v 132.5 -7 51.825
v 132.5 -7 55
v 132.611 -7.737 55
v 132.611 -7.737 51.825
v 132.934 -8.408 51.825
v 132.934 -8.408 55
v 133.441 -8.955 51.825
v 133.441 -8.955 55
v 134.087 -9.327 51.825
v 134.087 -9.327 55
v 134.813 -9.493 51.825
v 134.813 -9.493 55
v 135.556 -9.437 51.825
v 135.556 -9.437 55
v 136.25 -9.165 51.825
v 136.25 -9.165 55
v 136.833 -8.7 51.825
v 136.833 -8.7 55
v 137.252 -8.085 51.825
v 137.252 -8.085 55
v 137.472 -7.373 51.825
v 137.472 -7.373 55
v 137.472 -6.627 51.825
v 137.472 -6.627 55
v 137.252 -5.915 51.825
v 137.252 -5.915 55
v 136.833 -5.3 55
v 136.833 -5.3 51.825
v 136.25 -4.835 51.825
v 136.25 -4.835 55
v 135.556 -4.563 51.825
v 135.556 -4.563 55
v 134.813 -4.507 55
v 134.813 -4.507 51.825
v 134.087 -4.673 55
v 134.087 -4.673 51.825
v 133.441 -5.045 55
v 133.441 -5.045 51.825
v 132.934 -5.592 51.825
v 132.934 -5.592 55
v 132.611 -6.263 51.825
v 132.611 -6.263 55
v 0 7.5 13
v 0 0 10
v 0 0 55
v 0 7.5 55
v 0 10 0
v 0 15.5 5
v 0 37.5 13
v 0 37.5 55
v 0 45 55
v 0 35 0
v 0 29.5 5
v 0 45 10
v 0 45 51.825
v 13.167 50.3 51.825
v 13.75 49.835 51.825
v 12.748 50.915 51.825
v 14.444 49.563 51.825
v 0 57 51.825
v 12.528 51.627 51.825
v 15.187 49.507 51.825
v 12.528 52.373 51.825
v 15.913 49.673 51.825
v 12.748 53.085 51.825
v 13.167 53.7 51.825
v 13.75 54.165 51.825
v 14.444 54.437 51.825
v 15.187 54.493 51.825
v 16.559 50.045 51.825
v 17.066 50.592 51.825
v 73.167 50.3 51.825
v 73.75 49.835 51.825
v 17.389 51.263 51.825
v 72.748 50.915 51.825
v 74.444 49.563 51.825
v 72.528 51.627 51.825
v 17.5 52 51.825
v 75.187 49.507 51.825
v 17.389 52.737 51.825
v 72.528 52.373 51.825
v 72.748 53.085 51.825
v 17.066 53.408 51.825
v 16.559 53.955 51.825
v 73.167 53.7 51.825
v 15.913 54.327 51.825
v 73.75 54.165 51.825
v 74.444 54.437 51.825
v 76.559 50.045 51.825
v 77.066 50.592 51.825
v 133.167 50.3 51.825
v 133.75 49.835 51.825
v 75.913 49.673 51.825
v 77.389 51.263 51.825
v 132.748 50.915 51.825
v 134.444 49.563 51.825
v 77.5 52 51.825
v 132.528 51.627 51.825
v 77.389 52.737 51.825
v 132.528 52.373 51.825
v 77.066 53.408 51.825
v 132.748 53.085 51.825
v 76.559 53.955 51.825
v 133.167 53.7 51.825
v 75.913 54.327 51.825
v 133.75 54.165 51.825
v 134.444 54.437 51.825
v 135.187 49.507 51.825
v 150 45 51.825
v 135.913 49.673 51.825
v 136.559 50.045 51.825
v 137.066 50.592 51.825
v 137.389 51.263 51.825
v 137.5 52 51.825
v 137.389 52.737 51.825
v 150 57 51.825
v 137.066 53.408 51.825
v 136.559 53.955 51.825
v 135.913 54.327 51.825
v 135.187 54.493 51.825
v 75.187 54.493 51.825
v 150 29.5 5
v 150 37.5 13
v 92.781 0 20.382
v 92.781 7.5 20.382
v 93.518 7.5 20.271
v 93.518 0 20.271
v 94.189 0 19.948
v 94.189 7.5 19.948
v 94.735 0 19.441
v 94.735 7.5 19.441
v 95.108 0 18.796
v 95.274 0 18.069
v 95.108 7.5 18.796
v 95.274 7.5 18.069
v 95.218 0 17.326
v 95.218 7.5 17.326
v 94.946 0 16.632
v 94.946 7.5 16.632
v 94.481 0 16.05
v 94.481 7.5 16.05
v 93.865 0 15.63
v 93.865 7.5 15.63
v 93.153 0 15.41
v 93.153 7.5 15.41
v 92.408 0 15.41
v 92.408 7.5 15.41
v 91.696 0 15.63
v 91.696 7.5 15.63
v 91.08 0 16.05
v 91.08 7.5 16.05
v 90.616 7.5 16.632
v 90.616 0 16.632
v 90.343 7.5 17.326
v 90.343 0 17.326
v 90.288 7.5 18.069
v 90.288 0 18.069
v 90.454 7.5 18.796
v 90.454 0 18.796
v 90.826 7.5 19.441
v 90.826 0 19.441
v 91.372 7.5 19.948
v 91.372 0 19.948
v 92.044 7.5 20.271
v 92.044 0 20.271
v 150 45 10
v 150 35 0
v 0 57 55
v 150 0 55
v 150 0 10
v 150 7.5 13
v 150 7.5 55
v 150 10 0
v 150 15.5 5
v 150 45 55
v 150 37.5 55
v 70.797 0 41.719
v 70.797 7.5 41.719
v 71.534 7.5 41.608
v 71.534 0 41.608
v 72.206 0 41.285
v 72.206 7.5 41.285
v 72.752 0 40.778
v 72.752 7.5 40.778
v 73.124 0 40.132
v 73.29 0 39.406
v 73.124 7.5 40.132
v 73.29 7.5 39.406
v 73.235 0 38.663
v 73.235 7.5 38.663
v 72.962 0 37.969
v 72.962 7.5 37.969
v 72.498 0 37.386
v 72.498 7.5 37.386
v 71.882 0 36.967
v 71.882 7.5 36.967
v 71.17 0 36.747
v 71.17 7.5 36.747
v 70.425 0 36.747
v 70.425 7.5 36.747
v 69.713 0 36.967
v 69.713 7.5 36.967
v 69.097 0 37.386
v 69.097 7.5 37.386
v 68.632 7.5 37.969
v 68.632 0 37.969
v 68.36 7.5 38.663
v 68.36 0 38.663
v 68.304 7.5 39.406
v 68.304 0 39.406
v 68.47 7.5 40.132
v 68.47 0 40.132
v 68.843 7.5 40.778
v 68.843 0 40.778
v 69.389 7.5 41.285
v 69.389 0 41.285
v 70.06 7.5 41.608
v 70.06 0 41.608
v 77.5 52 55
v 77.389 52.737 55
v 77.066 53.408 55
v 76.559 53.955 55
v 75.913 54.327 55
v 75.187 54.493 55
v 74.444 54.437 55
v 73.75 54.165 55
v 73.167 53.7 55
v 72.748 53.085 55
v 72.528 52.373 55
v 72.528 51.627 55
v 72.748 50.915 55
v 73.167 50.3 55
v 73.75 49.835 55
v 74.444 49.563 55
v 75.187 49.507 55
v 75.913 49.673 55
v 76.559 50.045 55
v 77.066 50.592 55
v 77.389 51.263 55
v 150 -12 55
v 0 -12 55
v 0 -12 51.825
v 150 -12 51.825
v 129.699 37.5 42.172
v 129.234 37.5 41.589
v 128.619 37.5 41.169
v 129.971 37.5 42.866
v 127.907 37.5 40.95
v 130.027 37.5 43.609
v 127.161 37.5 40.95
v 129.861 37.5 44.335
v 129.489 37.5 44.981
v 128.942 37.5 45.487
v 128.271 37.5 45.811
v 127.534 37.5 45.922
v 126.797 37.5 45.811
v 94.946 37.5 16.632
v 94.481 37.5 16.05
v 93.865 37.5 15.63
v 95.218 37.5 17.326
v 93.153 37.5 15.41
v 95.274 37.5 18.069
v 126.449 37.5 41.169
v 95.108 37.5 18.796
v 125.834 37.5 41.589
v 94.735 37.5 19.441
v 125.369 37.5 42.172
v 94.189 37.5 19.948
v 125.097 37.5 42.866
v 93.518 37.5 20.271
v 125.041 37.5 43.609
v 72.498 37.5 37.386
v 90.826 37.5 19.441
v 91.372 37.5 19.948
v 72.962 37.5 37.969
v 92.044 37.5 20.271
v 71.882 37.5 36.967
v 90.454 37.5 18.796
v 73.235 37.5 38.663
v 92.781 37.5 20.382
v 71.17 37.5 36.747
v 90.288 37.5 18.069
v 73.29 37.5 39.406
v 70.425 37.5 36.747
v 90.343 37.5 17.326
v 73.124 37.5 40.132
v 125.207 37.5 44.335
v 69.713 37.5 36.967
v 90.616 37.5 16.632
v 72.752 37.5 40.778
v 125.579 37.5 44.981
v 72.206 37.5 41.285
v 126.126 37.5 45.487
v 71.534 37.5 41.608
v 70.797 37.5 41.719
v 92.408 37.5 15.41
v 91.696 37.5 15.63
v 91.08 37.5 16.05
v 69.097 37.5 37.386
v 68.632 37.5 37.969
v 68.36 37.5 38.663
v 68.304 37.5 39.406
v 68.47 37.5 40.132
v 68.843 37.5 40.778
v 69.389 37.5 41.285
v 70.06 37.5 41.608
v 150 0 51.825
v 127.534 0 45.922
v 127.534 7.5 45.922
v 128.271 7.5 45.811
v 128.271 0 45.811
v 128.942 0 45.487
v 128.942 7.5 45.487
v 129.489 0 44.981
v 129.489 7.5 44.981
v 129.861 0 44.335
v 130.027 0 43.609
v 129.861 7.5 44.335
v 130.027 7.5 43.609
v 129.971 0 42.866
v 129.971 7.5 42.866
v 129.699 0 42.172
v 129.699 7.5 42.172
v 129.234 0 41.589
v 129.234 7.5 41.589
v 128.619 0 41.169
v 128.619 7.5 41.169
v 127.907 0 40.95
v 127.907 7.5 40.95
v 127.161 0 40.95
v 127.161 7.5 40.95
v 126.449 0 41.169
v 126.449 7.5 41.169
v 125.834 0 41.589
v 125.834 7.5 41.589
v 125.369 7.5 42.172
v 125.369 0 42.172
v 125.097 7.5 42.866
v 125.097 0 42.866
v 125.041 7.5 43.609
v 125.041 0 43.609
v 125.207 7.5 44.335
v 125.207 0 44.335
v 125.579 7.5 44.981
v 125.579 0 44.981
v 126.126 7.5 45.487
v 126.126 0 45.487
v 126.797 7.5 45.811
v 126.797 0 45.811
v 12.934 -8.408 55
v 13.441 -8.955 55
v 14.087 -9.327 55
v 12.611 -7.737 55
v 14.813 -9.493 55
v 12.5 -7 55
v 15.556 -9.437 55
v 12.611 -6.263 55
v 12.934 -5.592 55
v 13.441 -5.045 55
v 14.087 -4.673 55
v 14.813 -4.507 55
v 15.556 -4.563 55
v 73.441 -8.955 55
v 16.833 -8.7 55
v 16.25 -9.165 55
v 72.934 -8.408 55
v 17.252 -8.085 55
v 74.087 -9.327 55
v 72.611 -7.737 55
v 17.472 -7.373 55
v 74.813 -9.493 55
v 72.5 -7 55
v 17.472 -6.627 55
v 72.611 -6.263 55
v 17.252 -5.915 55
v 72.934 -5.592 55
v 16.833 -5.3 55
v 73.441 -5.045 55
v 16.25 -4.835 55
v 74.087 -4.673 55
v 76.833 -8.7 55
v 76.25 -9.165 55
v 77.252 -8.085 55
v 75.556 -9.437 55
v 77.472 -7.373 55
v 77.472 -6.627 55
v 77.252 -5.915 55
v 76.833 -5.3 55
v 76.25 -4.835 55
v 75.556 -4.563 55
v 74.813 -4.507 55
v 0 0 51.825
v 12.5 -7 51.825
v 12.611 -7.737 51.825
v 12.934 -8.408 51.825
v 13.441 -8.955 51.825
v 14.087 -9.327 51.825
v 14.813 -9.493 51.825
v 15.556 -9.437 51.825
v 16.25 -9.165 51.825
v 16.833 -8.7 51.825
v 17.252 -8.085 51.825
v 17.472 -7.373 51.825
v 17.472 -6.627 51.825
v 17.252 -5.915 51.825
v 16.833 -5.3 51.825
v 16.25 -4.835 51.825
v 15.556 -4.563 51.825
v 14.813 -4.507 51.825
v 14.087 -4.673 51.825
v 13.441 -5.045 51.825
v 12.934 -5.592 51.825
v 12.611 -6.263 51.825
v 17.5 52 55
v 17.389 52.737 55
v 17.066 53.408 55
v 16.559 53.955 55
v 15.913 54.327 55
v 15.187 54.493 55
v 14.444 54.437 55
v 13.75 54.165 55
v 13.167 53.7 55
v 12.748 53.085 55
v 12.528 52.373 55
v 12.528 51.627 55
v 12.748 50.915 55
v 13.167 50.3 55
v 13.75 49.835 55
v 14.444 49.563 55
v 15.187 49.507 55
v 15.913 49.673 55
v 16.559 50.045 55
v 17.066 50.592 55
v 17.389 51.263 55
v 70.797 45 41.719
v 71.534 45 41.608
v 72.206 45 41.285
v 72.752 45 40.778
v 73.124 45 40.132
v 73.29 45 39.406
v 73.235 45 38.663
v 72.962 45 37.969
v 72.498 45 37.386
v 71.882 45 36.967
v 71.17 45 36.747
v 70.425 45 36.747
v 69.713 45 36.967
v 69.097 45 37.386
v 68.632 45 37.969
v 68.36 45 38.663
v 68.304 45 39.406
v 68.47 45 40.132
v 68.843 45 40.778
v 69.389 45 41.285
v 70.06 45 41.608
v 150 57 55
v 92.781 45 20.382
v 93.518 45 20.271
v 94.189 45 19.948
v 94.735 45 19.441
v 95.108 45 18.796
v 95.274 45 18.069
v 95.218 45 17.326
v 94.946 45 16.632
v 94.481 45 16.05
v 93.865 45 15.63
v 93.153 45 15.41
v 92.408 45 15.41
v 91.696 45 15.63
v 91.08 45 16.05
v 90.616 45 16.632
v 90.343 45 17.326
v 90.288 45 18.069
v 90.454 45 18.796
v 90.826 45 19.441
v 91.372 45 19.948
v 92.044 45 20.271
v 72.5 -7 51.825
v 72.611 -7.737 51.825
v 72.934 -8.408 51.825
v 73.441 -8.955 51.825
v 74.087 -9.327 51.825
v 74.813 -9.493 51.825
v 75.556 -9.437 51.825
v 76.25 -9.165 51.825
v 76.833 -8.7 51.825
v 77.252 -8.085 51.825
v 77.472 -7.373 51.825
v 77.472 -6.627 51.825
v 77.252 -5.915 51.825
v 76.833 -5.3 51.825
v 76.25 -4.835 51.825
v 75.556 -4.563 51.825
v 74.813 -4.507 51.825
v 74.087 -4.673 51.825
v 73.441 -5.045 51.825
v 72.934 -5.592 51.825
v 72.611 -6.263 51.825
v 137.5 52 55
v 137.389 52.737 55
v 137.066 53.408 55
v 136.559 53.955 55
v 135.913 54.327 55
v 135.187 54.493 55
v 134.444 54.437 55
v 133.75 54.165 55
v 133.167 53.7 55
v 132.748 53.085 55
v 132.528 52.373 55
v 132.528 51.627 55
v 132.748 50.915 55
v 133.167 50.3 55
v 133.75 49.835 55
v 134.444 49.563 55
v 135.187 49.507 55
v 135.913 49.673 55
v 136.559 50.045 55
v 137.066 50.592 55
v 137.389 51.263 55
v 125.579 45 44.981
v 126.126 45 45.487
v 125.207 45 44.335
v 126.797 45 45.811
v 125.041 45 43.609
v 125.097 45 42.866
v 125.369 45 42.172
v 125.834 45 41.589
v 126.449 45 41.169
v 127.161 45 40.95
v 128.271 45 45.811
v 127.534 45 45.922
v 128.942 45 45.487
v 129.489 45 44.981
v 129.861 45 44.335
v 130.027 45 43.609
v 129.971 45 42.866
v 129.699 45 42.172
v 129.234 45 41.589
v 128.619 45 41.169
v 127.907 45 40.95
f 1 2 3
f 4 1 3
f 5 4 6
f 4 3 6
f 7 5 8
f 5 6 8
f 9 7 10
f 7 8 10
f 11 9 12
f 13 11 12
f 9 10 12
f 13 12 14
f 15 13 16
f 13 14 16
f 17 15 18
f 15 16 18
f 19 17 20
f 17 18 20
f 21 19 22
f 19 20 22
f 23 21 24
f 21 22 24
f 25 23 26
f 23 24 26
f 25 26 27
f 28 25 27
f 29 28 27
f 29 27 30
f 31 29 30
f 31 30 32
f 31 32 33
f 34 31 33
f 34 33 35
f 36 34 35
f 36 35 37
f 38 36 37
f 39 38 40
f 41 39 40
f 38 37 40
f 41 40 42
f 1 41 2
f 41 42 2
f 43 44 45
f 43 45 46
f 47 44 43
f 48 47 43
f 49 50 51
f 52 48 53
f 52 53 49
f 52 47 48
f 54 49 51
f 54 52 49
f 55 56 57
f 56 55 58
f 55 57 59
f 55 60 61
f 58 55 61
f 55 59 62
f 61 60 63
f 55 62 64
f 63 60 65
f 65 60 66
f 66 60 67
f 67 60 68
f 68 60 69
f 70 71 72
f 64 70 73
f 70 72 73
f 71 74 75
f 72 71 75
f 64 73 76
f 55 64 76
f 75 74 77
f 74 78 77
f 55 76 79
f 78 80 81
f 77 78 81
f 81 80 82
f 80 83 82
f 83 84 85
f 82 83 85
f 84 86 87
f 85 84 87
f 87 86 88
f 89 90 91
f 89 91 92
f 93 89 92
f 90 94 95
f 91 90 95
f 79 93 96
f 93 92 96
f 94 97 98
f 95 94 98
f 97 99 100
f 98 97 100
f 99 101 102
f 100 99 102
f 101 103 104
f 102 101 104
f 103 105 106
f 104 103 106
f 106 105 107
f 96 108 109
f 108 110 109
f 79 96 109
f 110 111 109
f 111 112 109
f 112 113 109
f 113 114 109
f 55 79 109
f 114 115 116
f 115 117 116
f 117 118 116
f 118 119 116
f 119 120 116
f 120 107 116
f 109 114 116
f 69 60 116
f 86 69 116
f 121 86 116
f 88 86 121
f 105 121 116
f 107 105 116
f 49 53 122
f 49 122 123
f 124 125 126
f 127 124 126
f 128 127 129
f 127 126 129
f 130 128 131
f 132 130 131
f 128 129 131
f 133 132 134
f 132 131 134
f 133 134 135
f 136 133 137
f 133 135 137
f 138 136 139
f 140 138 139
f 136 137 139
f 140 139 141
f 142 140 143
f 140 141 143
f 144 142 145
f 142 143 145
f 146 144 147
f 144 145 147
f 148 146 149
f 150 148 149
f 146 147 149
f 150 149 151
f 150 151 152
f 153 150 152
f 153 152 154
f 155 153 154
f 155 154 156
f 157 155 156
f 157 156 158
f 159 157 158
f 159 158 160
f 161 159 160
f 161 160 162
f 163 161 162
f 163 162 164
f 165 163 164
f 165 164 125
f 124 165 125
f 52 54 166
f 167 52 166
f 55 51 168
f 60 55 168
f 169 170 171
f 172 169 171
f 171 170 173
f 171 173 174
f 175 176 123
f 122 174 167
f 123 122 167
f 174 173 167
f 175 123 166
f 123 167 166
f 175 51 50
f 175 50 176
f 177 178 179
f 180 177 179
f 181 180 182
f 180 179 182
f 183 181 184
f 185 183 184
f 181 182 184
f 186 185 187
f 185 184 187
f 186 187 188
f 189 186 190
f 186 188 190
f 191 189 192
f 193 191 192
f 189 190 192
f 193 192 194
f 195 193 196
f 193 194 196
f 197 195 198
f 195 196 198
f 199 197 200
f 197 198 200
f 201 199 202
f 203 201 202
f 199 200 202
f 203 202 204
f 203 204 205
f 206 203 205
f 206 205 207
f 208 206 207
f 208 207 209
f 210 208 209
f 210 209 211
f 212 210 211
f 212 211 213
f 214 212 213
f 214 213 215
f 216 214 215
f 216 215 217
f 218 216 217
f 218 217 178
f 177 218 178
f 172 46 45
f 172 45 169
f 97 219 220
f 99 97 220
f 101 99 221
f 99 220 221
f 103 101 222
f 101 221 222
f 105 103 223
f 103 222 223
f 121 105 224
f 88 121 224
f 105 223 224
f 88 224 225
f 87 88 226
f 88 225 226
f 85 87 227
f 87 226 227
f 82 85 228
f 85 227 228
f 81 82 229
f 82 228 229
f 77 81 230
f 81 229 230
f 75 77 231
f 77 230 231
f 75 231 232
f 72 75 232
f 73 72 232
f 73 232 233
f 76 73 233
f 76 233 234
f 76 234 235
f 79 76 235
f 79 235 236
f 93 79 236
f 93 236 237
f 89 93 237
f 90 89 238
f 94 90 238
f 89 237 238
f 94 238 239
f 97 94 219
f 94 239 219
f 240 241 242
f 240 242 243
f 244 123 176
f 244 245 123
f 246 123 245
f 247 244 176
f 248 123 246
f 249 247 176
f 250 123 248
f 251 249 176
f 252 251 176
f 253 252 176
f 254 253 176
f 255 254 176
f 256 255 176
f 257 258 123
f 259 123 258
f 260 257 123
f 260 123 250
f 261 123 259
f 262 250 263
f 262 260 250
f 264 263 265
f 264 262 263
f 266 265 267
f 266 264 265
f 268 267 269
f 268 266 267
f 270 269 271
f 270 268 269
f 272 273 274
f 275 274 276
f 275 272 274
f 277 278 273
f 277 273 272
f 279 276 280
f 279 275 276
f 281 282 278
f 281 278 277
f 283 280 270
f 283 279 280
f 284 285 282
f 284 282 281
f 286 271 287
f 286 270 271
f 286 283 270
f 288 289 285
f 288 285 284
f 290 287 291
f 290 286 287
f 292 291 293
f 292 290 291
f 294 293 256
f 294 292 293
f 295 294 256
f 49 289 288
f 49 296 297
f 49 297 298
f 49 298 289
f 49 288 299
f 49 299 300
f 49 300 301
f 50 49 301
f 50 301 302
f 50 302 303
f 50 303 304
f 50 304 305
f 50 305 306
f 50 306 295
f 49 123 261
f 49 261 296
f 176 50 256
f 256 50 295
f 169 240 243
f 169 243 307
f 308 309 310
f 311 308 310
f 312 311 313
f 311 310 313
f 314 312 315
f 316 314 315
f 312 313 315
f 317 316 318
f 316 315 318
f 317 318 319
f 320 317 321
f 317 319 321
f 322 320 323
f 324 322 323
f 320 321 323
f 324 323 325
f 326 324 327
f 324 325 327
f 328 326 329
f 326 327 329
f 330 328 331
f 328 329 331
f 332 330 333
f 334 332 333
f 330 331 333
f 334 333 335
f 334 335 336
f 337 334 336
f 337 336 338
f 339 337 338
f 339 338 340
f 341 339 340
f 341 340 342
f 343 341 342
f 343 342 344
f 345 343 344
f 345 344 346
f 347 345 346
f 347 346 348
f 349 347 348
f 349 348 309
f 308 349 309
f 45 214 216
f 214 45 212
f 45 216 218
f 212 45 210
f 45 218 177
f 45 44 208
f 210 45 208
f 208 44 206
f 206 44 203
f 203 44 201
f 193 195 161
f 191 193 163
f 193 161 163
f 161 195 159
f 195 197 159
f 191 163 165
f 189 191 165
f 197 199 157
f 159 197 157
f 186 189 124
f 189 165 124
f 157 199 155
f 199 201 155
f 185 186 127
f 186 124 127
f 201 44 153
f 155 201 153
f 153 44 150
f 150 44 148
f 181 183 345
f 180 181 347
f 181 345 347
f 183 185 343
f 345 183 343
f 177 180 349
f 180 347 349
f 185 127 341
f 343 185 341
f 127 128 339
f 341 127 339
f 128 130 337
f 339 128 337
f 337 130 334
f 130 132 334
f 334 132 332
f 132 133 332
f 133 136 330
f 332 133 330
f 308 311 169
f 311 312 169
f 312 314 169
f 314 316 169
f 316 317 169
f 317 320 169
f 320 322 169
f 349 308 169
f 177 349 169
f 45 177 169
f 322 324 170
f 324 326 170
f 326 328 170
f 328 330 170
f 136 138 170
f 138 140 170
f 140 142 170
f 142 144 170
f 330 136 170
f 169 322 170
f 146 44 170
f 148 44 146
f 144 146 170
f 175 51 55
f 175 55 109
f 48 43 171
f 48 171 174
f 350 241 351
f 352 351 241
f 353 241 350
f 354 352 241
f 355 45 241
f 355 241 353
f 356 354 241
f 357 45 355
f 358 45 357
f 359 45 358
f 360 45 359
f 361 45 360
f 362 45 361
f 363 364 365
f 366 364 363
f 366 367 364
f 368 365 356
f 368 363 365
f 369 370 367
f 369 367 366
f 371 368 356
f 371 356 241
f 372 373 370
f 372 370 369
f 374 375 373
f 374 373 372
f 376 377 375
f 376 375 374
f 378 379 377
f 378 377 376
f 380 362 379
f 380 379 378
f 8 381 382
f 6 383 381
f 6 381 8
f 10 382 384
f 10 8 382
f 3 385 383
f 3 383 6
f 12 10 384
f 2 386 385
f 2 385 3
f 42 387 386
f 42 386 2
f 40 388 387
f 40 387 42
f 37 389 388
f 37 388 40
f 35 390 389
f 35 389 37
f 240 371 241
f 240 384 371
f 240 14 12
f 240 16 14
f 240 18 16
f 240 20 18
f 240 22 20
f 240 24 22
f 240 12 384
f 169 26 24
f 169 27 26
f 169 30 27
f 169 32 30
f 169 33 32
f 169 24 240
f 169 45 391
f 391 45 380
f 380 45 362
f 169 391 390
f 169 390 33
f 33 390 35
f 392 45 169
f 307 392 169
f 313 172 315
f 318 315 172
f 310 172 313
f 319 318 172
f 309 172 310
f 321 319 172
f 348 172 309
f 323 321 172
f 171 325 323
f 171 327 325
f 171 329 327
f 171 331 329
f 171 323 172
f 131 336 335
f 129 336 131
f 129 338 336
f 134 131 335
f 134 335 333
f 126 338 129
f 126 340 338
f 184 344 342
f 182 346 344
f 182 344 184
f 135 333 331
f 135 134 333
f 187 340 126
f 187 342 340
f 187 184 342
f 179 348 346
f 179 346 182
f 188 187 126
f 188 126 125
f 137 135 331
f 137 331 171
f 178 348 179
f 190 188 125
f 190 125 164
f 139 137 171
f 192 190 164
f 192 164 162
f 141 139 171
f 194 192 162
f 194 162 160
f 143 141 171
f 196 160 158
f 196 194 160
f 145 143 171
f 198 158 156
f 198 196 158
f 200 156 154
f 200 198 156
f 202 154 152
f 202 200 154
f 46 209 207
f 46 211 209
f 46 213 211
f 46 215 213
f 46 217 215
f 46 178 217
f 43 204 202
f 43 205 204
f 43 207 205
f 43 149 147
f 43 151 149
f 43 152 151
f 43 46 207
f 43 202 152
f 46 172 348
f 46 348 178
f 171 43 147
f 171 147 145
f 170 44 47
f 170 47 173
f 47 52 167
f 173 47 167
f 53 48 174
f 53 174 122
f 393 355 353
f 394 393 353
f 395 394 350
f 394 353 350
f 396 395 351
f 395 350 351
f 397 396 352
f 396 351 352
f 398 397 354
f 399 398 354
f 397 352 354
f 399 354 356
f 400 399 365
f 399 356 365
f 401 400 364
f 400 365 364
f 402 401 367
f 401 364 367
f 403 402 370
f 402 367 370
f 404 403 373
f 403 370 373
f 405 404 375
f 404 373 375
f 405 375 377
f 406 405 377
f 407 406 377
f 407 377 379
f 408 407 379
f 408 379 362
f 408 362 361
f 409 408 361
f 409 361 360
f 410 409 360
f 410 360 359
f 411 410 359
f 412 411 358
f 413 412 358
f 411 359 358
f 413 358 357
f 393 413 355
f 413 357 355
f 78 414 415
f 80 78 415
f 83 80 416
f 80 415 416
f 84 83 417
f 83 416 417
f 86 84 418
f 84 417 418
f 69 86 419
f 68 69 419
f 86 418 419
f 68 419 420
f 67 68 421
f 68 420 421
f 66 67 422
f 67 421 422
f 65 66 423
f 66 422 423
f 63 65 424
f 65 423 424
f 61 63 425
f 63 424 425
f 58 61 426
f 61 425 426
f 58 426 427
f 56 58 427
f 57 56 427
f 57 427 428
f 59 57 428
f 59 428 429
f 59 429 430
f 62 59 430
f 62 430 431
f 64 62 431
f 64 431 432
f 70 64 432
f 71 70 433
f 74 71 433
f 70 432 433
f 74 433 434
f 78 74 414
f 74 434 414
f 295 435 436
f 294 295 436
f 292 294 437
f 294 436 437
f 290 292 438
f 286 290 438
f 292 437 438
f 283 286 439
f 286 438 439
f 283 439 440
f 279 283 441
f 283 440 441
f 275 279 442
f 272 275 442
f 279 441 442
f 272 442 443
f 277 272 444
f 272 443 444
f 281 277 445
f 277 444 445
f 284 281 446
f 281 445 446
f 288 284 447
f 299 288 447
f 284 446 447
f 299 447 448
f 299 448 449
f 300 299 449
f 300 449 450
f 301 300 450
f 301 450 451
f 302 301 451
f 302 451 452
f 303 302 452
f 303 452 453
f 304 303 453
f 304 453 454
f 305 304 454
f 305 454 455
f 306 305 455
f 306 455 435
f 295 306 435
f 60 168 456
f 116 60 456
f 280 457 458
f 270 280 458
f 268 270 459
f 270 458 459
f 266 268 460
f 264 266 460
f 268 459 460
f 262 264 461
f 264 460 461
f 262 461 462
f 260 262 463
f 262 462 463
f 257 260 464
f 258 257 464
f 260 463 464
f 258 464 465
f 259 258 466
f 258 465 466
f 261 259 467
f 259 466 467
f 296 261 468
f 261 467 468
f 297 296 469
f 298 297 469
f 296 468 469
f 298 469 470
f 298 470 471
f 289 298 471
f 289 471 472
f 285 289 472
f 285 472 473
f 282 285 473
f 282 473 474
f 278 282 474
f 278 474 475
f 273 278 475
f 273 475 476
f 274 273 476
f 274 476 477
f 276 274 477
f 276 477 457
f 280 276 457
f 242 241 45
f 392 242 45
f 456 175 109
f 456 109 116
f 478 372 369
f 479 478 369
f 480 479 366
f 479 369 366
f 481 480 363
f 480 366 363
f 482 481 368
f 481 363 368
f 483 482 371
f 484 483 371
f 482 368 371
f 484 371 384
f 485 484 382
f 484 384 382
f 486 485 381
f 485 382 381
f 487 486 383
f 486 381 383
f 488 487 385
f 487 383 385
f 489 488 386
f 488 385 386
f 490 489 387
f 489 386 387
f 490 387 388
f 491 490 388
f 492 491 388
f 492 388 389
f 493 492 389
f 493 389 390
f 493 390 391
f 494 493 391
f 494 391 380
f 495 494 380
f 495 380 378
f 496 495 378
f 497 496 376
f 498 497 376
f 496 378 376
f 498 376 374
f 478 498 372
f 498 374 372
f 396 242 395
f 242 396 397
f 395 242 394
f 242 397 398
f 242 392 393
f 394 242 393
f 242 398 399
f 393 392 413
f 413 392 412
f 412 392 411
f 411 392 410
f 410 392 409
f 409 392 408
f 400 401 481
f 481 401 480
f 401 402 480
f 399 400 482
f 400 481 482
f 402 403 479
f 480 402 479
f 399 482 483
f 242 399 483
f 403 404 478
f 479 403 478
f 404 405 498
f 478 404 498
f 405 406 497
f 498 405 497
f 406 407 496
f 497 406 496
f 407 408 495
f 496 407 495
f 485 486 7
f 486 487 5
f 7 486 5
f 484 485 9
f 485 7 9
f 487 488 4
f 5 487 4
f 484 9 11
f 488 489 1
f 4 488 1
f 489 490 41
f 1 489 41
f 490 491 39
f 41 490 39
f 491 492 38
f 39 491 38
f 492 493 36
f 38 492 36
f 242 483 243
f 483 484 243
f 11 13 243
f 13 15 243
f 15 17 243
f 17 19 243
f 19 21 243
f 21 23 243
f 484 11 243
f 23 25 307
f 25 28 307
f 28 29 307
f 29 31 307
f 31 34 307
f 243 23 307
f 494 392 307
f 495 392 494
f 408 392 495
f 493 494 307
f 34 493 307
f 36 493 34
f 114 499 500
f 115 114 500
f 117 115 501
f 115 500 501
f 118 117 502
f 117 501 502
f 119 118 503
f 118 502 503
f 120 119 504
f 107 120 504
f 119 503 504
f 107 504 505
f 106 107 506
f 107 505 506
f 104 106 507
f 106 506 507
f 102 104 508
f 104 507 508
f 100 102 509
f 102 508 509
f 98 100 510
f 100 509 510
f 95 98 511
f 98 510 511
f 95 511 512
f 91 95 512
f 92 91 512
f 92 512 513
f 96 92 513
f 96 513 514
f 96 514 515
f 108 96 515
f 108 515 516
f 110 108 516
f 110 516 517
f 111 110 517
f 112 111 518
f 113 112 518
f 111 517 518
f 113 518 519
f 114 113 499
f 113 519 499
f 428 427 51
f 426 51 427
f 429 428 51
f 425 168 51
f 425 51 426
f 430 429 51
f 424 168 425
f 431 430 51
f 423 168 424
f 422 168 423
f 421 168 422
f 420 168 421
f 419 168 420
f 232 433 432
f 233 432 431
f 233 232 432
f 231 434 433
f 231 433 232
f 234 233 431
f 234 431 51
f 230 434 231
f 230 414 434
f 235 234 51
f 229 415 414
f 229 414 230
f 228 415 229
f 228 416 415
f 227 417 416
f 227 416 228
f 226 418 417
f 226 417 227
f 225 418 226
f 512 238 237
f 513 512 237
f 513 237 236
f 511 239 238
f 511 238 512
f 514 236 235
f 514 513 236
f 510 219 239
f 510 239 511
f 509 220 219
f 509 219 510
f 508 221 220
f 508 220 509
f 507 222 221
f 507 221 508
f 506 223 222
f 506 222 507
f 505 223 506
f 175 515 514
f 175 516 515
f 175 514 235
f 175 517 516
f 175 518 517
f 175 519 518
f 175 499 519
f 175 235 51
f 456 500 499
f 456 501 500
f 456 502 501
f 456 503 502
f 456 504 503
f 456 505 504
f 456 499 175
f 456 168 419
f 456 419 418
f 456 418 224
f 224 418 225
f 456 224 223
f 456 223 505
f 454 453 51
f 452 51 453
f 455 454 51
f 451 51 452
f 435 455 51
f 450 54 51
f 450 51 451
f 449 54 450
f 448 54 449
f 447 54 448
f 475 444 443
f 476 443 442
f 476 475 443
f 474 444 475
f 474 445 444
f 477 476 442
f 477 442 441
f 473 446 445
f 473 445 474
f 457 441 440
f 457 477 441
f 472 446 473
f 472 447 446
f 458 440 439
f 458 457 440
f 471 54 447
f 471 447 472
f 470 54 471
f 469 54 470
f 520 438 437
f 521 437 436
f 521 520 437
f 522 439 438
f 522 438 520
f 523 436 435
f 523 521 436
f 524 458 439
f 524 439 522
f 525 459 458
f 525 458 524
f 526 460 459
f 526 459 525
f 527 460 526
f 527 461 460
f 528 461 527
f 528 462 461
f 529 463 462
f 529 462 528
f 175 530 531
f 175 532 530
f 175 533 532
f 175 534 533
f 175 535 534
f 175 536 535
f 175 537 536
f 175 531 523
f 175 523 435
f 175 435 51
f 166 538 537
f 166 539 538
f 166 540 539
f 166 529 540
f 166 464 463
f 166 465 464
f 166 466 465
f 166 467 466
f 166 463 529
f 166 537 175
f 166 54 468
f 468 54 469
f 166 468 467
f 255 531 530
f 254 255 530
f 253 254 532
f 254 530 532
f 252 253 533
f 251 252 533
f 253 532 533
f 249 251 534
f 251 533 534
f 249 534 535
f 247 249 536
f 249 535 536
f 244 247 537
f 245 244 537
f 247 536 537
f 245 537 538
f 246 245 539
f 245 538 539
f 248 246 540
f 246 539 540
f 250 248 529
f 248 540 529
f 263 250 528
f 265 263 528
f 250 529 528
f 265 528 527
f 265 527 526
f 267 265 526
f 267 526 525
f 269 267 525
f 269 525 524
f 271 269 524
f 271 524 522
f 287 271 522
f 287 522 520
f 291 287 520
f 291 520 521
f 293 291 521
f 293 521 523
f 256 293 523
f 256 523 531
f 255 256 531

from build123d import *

# Parameters (mm, degrees)
SKETCH1_W               = 150
SKETCH1_H               = 45
BOSS_EXTRUDE1_DEPTH     = 55
CUT_EXTRUDE1_DEPTH      = 166.981926727
CUT_EXTRUDE1_DEPTH_BACK = 166.981926727
CHAMFER1_SIZE           = 10
SKETCH3_R               = 2.5
CUT_EXTRUDE2_DEPTH      = 166.981926727
SKETCH4_W               = 150
SKETCH4_H               = 12
SKETCH4_R               = 2.5
BOSS_EXTRUDE2_DEPTH     = 3.175
BOSS_EXTRUDE2_2_DEPTH   = 3.175


with BuildPart() as part:
    # Sketch1 → Boss-Extrude1 (new body)
    with BuildSketch(Plane.XY):
        with Locations((75, 22.5)):
            Rectangle(SKETCH1_W, SKETCH1_H)
    extrude(amount=BOSS_EXTRUDE1_DEPTH)

    # Sketch2 → Cut-Extrude1 (cut, two sides: drawn at the far end of the back side and taken through both)
    with BuildSketch(Plane(origin=(150, 0, 0), x_dir=(0, 0, -1), z_dir=(1, 0, 0)).offset(-CUT_EXTRUDE1_DEPTH_BACK)):
        Polygon((-13, 37.5), (-55, 37.5), (-55, 7.5), (-13, 7.5), (-5, 15.5), (-5, 29.5), align=None)
    extrude(amount=CUT_EXTRUDE1_DEPTH + CUT_EXTRUDE1_DEPTH_BACK, mode=Mode.SUBTRACT)

    # Chamfer1
    chamfer1_edges = [part.edges().sort_by_distance(p)[0] for p in [
        (75, 45, 0),
        (75, 0, 0),
    ]]
    chamfer(chamfer1_edges, length=CHAMFER1_SIZE)

    # Sketch3 → Cut-Extrude2 (cut, through all)
    with BuildSketch(Plane(origin=(0, 45, 0), x_dir=(1, 0, 0), z_dir=(0, 1, 0))):
        with Locations(Location((92.780741235, -17.882235423, 0), (0, 0, 270))):
            Circle(SKETCH3_R)
        with Locations(Location((127.534008193, -43.42184556, 0), (0, 0, 270))):
            Circle(SKETCH3_R)
        with Locations(Location((70.797279345, -39.219124905, 0), (0, 0, 270))):
            Circle(SKETCH3_R)
    extrude(amount=-CUT_EXTRUDE2_DEPTH, mode=Mode.SUBTRACT)


with BuildPart() as body_2:
    # Sketch4 → Boss-Extrude2 (new body)
    with BuildSketch(Plane.XY.offset(55)):
        with Locations((75, 51)):
            Rectangle(SKETCH4_W, SKETCH4_H)
        with Locations((15, 52)):
            Circle(SKETCH4_R, mode=Mode.SUBTRACT)
        with Locations((75, 52)):
            Circle(SKETCH4_R, mode=Mode.SUBTRACT)
        with Locations((135, 52)):
            Circle(SKETCH4_R, mode=Mode.SUBTRACT)
    extrude(amount=-BOSS_EXTRUDE2_DEPTH)


with BuildPart() as body_3:
    # Sketch4 → Boss-Extrude2 2 (new body)
    with BuildSketch(Plane.XY.offset(55)):
        with Locations((75, -6)):
            Rectangle(SKETCH4_W, SKETCH4_H)
        with Locations(Location((135, -7, 0), (0, 0, 180))):
            Circle(SKETCH4_R, mode=Mode.SUBTRACT)
        with Locations(Location((75, -7, 0), (0, 0, 180))):
            Circle(SKETCH4_R, mode=Mode.SUBTRACT)
        with Locations(Location((15, -7, 0), (0, 0, 180))):
            Circle(SKETCH4_R, mode=Mode.SUBTRACT)
    extrude(amount=-BOSS_EXTRUDE2_2_DEPTH)


solid = Compound([part.part, body_2.part, body_3.part])
